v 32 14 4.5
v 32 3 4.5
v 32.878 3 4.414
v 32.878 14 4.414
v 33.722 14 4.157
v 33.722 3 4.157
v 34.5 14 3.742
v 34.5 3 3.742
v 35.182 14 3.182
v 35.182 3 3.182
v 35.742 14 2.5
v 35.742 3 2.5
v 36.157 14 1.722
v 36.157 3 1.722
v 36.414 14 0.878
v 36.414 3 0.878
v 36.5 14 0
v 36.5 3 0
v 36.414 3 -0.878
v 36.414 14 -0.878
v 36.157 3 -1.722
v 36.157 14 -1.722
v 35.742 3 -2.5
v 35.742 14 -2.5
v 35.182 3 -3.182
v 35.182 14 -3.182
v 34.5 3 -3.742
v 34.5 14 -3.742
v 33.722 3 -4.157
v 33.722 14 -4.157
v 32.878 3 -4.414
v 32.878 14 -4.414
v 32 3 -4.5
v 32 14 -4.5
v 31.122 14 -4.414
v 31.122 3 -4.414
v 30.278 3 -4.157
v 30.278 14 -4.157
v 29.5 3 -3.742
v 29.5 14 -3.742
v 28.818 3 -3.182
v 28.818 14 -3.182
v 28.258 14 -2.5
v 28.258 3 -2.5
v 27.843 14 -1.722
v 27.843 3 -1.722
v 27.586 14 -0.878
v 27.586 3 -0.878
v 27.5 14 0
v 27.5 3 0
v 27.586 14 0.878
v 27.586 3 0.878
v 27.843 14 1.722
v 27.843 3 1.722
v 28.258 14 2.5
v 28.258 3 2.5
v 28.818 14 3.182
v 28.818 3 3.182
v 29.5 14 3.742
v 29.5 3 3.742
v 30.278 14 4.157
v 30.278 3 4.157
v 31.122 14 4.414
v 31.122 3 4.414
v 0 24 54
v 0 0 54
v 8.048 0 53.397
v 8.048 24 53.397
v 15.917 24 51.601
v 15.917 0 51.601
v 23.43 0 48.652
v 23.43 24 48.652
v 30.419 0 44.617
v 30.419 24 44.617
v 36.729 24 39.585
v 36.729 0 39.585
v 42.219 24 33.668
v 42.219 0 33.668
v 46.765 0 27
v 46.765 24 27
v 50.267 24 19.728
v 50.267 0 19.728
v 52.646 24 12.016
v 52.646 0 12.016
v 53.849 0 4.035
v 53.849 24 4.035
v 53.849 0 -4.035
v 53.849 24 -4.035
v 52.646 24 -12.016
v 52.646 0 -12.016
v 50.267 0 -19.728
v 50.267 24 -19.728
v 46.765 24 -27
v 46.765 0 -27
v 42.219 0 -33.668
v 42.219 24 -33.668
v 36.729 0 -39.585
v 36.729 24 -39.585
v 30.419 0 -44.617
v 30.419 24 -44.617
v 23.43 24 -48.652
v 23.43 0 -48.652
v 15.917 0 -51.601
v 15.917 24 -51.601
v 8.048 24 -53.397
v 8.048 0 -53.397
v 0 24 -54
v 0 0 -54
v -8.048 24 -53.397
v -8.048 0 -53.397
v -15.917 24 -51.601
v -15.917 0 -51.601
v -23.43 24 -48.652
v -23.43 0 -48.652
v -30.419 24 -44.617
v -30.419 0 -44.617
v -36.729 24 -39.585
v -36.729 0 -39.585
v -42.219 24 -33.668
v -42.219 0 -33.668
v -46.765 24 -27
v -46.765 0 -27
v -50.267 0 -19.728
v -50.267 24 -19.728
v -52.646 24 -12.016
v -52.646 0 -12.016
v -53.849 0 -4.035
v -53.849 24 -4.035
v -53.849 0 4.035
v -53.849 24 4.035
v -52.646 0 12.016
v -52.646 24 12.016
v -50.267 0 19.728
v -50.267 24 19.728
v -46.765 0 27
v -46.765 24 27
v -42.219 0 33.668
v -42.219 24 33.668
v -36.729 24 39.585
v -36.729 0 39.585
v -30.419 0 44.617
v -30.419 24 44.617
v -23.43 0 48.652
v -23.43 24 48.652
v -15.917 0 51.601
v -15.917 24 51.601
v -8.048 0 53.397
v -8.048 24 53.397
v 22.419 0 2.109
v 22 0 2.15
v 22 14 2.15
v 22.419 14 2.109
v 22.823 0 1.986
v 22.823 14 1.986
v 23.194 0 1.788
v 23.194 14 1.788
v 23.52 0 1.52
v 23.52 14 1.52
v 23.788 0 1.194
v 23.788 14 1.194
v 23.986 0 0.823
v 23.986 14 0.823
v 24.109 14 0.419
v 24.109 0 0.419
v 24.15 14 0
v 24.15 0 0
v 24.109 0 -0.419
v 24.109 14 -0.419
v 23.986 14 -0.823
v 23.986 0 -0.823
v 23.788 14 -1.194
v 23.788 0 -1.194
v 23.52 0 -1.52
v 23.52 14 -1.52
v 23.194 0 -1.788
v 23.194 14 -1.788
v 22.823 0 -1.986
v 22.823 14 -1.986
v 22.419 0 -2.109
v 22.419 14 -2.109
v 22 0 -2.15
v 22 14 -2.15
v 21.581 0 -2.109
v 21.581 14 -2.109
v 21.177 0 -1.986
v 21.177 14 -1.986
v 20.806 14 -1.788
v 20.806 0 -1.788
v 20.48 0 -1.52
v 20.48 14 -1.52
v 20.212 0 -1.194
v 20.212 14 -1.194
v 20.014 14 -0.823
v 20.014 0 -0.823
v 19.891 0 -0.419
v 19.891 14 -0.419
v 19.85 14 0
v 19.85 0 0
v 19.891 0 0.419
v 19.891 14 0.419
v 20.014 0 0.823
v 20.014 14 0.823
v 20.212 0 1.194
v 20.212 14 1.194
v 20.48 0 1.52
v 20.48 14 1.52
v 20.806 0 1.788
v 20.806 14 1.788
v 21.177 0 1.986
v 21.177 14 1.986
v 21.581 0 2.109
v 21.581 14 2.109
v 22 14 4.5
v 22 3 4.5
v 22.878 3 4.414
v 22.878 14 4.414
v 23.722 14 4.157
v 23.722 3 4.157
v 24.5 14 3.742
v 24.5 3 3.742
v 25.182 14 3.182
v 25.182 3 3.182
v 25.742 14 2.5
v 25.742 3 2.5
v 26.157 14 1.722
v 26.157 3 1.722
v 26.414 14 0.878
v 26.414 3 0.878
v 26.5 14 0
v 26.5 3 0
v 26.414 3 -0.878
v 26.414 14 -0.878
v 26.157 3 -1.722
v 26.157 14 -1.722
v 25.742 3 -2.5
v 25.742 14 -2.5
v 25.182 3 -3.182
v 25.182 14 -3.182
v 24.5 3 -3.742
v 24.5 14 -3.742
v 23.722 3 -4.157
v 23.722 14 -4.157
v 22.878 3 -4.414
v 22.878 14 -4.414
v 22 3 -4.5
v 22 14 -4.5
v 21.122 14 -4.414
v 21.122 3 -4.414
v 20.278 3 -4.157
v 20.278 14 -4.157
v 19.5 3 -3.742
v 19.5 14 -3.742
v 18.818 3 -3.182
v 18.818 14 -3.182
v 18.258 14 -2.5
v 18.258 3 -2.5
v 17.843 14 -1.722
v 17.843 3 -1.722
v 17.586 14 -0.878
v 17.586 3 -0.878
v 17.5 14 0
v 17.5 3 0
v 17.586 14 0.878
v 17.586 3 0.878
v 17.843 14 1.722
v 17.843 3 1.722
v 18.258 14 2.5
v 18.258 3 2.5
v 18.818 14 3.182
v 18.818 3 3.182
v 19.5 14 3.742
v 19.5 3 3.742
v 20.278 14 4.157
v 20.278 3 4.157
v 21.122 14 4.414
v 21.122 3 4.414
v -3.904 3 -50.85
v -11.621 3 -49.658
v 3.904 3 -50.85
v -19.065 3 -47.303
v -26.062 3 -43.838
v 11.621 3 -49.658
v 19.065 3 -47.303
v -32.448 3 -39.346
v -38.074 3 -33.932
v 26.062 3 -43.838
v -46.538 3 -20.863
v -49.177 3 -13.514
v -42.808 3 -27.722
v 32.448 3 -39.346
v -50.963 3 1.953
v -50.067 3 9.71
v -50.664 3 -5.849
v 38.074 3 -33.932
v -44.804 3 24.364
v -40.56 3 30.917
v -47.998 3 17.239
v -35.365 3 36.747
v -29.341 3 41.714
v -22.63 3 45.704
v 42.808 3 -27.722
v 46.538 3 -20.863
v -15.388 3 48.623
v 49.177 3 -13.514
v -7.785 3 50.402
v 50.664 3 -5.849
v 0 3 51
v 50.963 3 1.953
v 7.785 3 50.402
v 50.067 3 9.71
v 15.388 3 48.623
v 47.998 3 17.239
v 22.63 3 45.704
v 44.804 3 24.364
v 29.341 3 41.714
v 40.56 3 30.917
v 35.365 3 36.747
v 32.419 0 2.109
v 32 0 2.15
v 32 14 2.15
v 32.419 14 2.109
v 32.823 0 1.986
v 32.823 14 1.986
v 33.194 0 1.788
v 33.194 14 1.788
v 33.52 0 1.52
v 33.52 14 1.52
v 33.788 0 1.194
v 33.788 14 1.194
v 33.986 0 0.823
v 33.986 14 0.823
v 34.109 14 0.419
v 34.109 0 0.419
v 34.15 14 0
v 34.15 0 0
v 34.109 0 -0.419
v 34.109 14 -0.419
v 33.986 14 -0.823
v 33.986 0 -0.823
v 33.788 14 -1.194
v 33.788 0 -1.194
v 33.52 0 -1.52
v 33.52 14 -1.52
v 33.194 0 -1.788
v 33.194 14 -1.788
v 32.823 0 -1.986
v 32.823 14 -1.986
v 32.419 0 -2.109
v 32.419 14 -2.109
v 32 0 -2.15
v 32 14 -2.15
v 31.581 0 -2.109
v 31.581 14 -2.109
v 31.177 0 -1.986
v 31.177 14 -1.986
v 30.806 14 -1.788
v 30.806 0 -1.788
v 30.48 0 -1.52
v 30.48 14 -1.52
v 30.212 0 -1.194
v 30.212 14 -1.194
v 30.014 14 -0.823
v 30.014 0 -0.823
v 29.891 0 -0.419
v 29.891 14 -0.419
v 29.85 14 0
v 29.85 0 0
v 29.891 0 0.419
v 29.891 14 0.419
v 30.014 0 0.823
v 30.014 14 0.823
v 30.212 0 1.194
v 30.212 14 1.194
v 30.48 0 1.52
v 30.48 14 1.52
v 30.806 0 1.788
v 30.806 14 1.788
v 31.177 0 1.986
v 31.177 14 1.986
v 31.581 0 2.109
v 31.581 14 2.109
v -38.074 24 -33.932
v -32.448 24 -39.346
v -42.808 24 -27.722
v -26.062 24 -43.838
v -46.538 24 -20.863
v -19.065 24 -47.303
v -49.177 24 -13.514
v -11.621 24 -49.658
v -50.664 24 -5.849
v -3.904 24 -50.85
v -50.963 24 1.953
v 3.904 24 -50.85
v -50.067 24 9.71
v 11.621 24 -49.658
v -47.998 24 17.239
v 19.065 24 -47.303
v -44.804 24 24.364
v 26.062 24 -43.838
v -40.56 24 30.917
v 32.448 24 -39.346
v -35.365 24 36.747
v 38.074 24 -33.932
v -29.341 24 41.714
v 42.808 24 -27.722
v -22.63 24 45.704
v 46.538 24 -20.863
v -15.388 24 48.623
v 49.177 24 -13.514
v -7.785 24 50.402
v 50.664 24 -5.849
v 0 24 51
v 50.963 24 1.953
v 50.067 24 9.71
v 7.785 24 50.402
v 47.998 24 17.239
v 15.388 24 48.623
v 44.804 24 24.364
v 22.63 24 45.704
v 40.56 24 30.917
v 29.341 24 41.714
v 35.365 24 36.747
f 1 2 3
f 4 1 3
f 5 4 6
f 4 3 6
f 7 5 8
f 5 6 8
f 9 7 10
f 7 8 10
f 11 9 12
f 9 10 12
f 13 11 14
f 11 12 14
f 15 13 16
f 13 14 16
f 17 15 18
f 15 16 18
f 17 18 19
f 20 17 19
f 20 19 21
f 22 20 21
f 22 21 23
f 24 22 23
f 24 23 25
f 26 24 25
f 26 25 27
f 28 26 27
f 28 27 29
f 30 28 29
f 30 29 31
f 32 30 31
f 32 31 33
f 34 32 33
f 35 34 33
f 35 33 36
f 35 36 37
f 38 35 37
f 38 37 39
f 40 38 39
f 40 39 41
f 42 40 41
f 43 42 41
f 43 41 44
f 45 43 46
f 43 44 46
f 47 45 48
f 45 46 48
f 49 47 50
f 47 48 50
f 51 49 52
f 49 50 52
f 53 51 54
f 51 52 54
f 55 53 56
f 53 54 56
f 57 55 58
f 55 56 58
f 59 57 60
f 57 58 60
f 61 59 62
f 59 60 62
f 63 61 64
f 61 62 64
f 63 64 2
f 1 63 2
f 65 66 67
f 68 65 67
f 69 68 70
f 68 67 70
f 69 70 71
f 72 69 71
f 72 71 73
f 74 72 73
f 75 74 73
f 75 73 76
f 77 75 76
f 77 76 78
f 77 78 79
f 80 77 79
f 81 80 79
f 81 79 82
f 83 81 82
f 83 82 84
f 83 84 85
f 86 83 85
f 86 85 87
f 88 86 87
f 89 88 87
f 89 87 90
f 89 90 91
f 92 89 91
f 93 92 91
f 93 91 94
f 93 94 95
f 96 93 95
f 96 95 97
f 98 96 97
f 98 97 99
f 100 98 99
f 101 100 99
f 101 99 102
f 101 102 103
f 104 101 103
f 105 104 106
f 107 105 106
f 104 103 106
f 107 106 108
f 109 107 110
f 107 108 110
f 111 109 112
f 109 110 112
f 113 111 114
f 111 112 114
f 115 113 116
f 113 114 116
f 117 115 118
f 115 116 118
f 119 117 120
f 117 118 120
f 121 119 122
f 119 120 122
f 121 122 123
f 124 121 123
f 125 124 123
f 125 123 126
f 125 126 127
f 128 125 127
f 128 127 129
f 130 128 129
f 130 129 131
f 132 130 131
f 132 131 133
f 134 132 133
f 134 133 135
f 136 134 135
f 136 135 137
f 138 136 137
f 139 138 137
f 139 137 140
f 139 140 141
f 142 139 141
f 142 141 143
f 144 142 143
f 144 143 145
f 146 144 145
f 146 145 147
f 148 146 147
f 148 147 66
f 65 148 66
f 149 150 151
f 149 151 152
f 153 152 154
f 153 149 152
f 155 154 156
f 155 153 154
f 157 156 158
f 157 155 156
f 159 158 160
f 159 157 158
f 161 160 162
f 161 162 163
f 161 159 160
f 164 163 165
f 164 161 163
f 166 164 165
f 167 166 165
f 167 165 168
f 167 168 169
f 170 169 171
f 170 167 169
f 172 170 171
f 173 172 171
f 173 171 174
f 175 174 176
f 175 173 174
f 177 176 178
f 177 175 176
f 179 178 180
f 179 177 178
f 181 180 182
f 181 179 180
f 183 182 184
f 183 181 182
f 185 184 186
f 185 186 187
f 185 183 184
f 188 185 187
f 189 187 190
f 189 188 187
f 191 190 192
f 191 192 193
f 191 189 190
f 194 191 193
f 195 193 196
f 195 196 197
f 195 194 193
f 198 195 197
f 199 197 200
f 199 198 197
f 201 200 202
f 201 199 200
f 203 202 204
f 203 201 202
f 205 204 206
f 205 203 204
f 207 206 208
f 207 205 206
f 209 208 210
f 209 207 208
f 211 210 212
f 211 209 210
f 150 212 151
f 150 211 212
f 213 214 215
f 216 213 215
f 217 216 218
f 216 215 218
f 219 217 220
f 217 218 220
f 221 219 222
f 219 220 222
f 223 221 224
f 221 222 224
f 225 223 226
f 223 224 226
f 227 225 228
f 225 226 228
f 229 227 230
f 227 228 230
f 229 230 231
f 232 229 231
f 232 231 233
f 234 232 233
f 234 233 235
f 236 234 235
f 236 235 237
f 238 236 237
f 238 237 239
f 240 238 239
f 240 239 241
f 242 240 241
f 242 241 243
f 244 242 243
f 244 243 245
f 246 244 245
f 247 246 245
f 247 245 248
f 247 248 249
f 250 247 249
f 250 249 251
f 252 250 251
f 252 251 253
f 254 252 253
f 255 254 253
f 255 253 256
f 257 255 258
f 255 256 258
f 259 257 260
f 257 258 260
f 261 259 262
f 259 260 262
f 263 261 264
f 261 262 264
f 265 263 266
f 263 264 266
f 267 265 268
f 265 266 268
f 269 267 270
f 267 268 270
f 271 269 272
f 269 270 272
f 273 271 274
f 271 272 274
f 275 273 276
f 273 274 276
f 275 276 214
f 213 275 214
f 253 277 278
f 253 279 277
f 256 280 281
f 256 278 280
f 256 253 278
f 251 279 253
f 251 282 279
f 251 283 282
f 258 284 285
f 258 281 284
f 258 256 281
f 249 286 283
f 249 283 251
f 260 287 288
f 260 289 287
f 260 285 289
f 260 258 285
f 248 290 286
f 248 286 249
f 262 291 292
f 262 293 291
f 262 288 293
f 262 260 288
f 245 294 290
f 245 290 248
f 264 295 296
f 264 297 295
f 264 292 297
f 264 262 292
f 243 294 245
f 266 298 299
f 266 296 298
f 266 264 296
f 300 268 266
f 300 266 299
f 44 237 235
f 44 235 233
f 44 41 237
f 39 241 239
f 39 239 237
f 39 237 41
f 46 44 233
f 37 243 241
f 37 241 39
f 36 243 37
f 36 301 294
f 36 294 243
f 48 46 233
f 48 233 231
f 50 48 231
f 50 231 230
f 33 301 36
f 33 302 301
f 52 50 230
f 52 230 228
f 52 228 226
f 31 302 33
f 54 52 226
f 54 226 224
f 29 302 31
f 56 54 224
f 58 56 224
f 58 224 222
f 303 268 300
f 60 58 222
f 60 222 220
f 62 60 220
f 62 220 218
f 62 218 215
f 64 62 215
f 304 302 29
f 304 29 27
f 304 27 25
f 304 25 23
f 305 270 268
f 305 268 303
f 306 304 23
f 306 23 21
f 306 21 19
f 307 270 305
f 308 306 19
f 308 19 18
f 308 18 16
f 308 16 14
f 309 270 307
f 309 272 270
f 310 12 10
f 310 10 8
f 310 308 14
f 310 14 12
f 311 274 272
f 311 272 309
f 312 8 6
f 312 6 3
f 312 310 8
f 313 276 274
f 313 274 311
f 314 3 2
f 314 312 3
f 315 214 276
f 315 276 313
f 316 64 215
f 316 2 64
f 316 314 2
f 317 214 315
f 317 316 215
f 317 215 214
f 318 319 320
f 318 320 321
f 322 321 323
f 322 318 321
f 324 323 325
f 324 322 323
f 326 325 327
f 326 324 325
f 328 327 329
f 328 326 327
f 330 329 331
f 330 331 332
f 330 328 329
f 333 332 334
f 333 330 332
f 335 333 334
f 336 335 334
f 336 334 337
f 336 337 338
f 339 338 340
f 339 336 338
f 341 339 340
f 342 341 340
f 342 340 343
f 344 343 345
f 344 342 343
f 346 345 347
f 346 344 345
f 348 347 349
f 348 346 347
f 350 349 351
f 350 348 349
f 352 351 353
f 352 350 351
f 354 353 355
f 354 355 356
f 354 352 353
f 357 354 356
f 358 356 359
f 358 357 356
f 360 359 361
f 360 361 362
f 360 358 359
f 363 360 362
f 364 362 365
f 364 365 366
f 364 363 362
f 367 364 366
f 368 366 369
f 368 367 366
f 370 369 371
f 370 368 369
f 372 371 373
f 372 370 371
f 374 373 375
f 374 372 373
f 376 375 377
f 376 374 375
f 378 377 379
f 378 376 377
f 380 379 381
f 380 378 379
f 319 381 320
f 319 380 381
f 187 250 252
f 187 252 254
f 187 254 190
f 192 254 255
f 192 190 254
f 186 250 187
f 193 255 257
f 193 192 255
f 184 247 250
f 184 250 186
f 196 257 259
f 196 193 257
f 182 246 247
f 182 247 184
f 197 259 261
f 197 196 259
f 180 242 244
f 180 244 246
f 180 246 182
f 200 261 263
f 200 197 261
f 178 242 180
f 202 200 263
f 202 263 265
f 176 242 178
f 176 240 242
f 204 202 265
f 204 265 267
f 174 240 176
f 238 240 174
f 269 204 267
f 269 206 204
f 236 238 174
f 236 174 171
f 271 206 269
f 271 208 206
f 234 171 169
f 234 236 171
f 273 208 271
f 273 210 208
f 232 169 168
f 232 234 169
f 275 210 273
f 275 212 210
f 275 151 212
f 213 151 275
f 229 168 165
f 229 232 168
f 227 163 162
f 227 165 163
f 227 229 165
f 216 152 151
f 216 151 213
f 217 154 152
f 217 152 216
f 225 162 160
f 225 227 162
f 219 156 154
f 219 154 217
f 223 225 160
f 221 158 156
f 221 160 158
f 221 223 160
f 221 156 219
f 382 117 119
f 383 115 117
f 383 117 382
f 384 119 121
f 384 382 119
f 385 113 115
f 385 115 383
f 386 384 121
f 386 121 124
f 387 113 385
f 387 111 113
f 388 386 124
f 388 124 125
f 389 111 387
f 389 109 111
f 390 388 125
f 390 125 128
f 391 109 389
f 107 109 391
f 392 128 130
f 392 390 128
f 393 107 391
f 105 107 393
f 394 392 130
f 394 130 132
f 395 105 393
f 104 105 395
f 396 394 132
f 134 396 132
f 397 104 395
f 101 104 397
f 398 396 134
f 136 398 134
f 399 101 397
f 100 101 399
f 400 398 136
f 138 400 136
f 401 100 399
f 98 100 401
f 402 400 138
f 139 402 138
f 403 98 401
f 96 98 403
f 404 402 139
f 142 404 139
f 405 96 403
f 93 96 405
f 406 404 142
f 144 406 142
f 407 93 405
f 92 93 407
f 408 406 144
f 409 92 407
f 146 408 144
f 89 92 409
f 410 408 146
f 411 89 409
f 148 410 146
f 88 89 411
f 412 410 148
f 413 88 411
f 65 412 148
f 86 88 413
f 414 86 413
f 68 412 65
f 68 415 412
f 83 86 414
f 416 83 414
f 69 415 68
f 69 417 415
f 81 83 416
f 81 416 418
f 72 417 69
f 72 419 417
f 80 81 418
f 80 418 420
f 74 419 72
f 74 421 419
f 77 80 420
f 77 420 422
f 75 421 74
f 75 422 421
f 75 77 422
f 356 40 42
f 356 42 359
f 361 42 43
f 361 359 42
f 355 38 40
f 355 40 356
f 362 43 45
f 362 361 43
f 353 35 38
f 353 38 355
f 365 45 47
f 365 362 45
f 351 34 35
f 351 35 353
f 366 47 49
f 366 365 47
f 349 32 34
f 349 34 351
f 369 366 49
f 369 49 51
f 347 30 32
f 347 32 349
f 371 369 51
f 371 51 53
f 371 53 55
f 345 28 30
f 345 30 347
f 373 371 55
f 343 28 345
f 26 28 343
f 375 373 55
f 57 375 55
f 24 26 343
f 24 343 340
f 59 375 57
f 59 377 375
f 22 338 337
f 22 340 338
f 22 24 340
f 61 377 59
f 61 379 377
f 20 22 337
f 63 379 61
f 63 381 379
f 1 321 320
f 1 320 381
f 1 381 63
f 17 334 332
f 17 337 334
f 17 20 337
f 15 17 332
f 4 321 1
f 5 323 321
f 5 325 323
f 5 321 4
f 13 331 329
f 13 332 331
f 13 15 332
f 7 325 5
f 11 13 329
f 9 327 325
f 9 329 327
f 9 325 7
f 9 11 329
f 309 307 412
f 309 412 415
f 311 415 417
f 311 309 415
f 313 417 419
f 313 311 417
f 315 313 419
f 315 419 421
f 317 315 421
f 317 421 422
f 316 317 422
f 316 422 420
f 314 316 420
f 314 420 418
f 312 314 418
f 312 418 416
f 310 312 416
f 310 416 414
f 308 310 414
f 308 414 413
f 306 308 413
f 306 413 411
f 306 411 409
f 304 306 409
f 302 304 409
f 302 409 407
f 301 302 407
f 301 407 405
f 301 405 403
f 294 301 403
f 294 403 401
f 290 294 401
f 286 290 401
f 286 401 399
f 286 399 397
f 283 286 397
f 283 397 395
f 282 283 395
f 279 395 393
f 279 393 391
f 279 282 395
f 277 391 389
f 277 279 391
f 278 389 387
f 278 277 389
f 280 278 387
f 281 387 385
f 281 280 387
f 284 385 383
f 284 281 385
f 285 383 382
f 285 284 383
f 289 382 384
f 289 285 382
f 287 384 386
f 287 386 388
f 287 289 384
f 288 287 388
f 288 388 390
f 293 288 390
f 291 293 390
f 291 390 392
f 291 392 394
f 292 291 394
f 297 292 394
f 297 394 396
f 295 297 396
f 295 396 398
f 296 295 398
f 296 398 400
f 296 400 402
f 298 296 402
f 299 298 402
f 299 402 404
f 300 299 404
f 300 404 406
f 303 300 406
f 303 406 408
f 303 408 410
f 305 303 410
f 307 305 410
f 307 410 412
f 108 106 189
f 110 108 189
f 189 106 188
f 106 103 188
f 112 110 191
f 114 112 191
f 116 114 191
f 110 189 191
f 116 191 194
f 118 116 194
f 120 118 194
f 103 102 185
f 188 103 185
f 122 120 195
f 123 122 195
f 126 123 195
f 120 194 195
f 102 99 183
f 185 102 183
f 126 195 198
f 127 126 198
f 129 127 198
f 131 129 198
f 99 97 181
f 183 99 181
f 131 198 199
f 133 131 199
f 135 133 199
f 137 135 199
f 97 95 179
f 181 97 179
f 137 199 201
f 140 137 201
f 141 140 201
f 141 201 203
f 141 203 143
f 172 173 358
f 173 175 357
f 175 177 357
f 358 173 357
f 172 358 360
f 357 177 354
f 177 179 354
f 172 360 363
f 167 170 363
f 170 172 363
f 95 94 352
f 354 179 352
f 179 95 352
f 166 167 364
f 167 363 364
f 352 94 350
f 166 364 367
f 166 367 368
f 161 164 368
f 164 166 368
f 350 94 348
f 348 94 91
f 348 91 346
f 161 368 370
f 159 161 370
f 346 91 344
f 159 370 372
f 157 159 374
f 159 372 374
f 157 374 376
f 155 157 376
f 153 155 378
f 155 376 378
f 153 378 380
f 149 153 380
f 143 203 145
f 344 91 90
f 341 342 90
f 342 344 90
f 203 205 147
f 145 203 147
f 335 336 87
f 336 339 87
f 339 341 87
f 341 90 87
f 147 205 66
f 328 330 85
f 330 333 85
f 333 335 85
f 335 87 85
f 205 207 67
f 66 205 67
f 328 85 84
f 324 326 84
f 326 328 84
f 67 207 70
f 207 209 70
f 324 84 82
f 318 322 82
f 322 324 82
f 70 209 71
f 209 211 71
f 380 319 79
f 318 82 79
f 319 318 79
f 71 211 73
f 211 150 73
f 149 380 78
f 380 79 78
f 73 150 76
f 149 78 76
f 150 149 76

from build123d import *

# Parameters (mm, degrees)
SKETCH_1_R                     = 54
FLOOR_D108_T3_DEPTH            = 3
SKETCH_2_R                     = 54
SKETCH_2_R_2                   = 51
RIM_OD108_ID102_H24_DEPTH      = 24
SKETCH_3_R                     = 4.5
SENSOR_FIXED_POSTS_DEPTH       = 14
SKETCH_4_R                     = 2.15
M4_FIXED_MOUNT_CLEARANCE_DEPTH = 14


with BuildPart() as part:
    # 草图1 → Floor_D108_T3 (new body)
    with BuildSketch(Plane(origin=(0, 0, 0), x_dir=(1, 0, 0), z_dir=(0, 1, 0))):
        with Locations(Location((0, 0, 0), (0, 0, 270))):
            Circle(SKETCH_1_R)
    extrude(amount=FLOOR_D108_T3_DEPTH)

    # 草图2 → Rim_OD108_ID102_H24 (add)
    with BuildSketch(Plane(origin=(0, 0, 0), x_dir=(1, 0, 0), z_dir=(0, 1, 0))):
        with Locations(Location((0, 0, 0), (0, 0, 270))):
            Circle(SKETCH_2_R)
        with Locations(Location((0, 0, 0), (0, 0, 270))):
            Circle(SKETCH_2_R_2, mode=Mode.SUBTRACT)
    extrude(amount=RIM_OD108_ID102_H24_DEPTH)

    # 草图3 → Sensor_fixed_posts (add)
    with BuildSketch(Plane(origin=(0, 0, 0), x_dir=(1, 0, 0), z_dir=(0, 1, 0))):
        with Locations(Location((22, 0, 0), (0, 0, 270))):
            Circle(SKETCH_3_R)
        with Locations(Location((32, 0, 0), (0, 0, 270))):
            Circle(SKETCH_3_R)
    extrude(amount=SENSOR_FIXED_POSTS_DEPTH)

    # 草图4 → M4_fixed_mount_clearance (cut)
    with BuildSketch(Plane(origin=(0, 0, 0), x_dir=(1, 0, 0), z_dir=(0, 1, 0))):
        with Locations(Location((22, 0, 0), (0, 0, 270))):
            Circle(SKETCH_4_R)
        with Locations(Location((32, 0, 0), (0, 0, 270))):
            Circle(SKETCH_4_R)
    extrude(amount=M4_FIXED_MOUNT_CLEARANCE_DEPTH, mode=Mode.SUBTRACT)


solid = part.part
